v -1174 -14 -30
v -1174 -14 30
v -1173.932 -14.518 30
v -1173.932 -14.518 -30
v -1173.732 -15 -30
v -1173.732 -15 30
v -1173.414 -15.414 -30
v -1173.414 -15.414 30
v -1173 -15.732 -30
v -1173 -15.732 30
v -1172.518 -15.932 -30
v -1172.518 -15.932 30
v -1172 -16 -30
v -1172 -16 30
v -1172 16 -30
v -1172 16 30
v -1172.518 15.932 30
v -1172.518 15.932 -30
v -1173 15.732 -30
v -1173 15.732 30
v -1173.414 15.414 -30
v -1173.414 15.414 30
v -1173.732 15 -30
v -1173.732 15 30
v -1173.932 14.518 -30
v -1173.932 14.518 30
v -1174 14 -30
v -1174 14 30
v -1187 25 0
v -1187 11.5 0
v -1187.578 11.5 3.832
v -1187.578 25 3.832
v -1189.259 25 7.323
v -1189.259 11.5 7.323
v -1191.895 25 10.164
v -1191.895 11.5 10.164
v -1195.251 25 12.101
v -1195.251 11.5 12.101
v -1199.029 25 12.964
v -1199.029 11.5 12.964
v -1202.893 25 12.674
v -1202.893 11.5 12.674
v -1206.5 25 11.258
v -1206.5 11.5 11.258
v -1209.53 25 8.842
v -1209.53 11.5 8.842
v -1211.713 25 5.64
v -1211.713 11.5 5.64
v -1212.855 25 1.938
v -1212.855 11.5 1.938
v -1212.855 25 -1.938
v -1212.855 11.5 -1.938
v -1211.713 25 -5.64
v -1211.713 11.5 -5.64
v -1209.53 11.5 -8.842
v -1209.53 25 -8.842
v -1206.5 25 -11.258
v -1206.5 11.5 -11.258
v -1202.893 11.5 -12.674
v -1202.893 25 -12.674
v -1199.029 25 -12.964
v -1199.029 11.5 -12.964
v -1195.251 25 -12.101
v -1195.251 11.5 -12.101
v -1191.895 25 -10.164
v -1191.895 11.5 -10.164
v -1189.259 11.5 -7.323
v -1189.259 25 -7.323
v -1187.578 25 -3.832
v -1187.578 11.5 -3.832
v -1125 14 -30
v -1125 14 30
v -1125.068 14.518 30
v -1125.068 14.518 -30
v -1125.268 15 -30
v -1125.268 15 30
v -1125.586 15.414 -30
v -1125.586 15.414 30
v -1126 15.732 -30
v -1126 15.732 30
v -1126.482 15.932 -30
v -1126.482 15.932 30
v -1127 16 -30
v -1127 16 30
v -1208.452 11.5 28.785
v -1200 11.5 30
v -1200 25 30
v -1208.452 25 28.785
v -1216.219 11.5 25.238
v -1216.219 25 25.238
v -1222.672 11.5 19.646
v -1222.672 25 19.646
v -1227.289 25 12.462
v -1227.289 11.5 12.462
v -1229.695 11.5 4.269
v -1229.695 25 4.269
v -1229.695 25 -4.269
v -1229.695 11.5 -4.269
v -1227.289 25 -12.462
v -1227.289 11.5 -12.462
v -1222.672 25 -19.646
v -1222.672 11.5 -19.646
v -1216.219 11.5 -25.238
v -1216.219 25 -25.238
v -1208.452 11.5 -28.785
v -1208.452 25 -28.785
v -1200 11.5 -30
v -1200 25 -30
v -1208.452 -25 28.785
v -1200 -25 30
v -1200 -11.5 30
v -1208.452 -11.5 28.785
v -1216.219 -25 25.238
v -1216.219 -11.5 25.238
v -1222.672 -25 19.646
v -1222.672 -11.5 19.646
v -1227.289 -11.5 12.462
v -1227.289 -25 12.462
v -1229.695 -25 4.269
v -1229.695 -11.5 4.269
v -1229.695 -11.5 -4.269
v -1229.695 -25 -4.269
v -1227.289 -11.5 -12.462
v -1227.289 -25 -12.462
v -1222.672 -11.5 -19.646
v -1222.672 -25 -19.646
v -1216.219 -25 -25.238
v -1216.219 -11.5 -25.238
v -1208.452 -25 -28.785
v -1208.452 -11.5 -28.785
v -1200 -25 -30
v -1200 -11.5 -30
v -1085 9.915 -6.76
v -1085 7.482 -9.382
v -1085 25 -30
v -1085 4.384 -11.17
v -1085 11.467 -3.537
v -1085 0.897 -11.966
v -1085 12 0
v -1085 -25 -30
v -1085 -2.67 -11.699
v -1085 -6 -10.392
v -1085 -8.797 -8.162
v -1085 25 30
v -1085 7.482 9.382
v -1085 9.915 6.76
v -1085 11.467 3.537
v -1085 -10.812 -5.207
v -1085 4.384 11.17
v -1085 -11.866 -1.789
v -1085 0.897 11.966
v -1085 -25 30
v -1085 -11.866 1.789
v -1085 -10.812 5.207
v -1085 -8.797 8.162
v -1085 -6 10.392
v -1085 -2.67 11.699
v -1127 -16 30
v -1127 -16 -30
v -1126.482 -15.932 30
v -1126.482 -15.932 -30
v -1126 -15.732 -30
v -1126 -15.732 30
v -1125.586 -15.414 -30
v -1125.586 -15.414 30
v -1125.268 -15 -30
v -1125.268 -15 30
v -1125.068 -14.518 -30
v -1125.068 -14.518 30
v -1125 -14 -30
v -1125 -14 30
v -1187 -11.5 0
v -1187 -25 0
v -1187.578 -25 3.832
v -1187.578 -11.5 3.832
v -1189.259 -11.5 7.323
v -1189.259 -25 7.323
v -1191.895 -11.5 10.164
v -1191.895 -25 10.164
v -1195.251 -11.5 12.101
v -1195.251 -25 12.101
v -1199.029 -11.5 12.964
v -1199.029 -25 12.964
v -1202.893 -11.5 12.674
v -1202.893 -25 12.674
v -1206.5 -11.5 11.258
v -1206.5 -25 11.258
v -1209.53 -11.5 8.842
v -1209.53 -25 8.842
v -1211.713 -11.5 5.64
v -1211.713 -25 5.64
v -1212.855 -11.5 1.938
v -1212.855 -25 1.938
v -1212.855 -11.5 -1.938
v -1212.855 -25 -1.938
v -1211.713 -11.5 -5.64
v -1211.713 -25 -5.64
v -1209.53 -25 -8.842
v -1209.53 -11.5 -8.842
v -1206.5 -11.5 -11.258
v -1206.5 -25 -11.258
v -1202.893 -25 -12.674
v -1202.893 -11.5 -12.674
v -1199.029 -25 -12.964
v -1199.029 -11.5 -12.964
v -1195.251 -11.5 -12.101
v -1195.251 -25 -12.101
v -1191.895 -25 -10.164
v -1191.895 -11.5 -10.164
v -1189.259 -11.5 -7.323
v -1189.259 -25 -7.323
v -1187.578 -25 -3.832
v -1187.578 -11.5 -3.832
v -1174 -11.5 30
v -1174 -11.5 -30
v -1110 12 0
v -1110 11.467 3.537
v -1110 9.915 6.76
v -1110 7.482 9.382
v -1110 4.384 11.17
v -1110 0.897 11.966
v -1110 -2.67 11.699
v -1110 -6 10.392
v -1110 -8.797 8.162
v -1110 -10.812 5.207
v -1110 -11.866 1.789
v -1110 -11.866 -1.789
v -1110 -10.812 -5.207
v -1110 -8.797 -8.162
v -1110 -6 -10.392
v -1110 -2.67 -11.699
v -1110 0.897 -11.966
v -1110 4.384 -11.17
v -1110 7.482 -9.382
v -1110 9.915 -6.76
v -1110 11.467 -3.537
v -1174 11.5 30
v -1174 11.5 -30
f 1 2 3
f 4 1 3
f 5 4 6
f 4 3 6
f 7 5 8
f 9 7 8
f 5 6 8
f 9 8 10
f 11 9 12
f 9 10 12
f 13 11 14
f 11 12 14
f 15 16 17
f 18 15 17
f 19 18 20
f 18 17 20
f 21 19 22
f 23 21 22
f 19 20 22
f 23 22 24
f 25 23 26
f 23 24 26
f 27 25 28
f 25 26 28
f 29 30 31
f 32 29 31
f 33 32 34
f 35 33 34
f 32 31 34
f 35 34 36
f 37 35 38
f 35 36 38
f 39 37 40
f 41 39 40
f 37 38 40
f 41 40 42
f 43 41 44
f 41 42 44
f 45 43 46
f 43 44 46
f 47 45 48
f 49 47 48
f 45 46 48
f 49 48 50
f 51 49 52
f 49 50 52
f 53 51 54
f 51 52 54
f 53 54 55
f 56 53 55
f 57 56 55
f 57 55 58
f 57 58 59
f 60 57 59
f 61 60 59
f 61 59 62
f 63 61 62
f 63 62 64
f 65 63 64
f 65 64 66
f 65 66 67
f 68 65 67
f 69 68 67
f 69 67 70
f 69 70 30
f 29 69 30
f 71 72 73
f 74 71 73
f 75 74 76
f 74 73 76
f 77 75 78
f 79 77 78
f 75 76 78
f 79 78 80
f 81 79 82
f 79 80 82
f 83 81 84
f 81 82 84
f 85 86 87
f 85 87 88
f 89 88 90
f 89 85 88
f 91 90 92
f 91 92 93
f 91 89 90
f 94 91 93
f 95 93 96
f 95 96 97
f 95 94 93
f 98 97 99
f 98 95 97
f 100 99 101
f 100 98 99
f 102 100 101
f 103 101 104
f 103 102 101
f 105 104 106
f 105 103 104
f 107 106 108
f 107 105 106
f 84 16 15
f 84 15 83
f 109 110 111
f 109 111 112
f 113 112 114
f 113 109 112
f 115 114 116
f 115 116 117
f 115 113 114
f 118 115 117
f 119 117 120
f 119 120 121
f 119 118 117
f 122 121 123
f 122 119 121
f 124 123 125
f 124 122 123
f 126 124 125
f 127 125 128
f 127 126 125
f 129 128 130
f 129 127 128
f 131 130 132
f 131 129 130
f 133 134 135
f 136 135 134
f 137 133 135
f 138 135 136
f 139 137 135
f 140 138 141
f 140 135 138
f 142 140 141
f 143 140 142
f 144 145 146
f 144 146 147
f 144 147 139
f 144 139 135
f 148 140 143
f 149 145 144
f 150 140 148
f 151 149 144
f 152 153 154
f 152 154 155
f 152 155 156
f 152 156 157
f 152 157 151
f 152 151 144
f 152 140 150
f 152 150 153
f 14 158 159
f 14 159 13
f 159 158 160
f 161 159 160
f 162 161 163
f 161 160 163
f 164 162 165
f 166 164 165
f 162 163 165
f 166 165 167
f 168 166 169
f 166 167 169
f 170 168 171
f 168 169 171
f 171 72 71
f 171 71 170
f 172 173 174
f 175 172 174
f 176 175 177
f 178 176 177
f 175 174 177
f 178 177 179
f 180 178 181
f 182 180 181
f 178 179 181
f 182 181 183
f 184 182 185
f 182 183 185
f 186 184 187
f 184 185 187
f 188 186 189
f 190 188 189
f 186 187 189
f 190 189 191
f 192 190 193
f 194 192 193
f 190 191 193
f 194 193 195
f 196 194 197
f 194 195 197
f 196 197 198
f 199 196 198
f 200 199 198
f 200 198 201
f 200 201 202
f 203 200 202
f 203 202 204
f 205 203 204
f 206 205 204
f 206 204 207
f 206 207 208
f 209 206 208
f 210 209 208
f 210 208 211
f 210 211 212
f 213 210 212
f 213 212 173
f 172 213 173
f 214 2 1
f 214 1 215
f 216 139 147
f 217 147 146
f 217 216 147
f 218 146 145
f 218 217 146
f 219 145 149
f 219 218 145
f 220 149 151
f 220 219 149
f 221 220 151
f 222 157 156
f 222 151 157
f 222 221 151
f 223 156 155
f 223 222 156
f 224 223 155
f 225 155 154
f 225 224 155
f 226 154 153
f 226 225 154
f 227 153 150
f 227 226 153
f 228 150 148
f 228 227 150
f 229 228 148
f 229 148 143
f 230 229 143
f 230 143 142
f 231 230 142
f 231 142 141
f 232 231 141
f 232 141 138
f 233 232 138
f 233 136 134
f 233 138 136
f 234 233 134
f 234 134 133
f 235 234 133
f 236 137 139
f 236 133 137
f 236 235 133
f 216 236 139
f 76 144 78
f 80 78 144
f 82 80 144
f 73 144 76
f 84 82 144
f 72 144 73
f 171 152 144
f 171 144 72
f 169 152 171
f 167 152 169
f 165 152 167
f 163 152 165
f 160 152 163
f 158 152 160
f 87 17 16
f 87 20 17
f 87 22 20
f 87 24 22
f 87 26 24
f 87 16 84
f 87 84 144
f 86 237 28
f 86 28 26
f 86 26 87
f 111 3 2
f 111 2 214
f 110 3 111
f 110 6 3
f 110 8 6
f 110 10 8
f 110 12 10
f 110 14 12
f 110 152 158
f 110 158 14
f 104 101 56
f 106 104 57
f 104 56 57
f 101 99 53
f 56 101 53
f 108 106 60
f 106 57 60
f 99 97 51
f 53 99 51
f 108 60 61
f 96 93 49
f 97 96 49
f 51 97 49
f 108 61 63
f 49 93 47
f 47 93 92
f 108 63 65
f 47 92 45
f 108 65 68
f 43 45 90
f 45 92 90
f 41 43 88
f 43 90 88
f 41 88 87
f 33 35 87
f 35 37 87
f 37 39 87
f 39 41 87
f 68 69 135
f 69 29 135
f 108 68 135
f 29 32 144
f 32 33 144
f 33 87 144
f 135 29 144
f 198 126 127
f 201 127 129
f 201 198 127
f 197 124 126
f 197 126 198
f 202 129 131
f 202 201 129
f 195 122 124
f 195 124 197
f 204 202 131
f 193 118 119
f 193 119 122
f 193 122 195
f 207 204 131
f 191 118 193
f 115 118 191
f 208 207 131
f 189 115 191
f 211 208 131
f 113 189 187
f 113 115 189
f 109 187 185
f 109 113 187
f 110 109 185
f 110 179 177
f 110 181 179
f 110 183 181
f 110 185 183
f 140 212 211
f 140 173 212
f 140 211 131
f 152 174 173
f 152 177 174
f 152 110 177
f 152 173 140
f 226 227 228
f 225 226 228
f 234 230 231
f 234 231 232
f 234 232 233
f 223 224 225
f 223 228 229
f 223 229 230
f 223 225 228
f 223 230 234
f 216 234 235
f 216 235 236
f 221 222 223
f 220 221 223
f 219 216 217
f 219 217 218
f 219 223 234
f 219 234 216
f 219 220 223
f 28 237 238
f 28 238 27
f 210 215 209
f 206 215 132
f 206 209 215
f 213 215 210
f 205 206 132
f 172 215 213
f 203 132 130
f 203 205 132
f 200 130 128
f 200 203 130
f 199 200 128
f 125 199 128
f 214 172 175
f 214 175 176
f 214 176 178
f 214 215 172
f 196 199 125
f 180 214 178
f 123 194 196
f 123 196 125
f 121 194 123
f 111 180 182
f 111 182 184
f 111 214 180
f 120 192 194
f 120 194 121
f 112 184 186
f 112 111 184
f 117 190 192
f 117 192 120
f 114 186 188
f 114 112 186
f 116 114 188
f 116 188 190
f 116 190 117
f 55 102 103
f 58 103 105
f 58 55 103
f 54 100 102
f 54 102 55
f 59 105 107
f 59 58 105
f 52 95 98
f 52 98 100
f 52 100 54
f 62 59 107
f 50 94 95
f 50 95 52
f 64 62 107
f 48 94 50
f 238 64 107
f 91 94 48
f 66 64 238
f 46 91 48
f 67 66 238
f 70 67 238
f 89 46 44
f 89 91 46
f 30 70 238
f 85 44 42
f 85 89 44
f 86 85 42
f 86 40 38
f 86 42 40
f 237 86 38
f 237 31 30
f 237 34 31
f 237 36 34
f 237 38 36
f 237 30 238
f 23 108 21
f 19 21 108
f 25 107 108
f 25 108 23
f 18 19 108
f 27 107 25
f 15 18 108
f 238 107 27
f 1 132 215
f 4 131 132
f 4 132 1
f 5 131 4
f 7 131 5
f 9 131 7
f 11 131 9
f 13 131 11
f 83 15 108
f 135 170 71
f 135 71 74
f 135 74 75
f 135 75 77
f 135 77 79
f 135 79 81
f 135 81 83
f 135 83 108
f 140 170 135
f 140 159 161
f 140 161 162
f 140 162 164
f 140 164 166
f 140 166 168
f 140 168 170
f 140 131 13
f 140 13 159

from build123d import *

# Parameters (mm, degrees)
SKETCH007_R      = 13
EXTRUDE_DEPTH    = 65
SKETCH017_R      = 12
EXTRUDE008_DEPTH = 40
EXTRUDE007_DEPTH = 75
PAD_DEPTH        = 25


with BuildPart() as extrude_body:
    # Sketch007 (on Face6 of Pad) → Extrude (new body)
    with BuildSketch(Plane.XZ.offset(25)):
        Circle(SKETCH007_R)
    extrude(amount=-EXTRUDE_DEPTH)


with BuildPart() as extrude008:
    # Sketch017 → Extrude008 (new body)
    with BuildSketch(Plane.YZ.offset(90)):
        Circle(SKETCH017_R)
    extrude(amount=EXTRUDE008_DEPTH)


with BuildPart() as extrude007:
    # Sketch016 → Extrude007 (new body, symmetric)
    with BuildSketch(Plane.XY):
        with BuildLine():
            Line((-30, 11.5), (26, 11.5))
            Line((26, 11.5), (26, 14))
            ThreePointArc((28, 16), (26.585786, 15.414214), (26, 14))
            Line((28, 16), (73, 16))
            ThreePointArc((75, 14), (74.414214, 15.414214), (73, 16))
            Line((75, 14), (75, -14))
            ThreePointArc((73, -16), (74.414214, -15.414214), (75, -14))
            Line((73, -16), (28, -16))
            ThreePointArc((26, -14), (26.585786, -15.414214), (28, -16))
            Line((26, -14), (26, -11.5))
            Line((26, -11.5), (-30, -11.5))
            Line((-30, -11.5), (-30, 11.5))
        make_face()
    extrude(amount=EXTRUDE007_DEPTH, both=True)


with BuildPart() as forkendl:
    # Sketch → Pad (new body, symmetric)
    with BuildSketch(Plane.XZ):
        with BuildLine():
            Line((115, 30), (0, 30))
            ThreePointArc((0, 30), (-30, 0), (0, -30))
            Line((0, -30), (115, -30))
            Line((115, -30), (115, 30))
        make_face()
    extrude(amount=PAD_DEPTH, both=True)

    # Cut: cut Extrude007
    add(extrude007.part, mode=Mode.SUBTRACT)

    # Cut007: cut Extrude008
    add(extrude008.part, mode=Mode.SUBTRACT)

    # Cut008: cut Extrude body
    add(extrude_body.part, mode=Mode.SUBTRACT)


with BuildPart() as forkendl_1:
    # Cut008 placement: moved
    add(forkendl.part.moved(Location((-1200, 0, 0))))


solid = forkendl_1.part
